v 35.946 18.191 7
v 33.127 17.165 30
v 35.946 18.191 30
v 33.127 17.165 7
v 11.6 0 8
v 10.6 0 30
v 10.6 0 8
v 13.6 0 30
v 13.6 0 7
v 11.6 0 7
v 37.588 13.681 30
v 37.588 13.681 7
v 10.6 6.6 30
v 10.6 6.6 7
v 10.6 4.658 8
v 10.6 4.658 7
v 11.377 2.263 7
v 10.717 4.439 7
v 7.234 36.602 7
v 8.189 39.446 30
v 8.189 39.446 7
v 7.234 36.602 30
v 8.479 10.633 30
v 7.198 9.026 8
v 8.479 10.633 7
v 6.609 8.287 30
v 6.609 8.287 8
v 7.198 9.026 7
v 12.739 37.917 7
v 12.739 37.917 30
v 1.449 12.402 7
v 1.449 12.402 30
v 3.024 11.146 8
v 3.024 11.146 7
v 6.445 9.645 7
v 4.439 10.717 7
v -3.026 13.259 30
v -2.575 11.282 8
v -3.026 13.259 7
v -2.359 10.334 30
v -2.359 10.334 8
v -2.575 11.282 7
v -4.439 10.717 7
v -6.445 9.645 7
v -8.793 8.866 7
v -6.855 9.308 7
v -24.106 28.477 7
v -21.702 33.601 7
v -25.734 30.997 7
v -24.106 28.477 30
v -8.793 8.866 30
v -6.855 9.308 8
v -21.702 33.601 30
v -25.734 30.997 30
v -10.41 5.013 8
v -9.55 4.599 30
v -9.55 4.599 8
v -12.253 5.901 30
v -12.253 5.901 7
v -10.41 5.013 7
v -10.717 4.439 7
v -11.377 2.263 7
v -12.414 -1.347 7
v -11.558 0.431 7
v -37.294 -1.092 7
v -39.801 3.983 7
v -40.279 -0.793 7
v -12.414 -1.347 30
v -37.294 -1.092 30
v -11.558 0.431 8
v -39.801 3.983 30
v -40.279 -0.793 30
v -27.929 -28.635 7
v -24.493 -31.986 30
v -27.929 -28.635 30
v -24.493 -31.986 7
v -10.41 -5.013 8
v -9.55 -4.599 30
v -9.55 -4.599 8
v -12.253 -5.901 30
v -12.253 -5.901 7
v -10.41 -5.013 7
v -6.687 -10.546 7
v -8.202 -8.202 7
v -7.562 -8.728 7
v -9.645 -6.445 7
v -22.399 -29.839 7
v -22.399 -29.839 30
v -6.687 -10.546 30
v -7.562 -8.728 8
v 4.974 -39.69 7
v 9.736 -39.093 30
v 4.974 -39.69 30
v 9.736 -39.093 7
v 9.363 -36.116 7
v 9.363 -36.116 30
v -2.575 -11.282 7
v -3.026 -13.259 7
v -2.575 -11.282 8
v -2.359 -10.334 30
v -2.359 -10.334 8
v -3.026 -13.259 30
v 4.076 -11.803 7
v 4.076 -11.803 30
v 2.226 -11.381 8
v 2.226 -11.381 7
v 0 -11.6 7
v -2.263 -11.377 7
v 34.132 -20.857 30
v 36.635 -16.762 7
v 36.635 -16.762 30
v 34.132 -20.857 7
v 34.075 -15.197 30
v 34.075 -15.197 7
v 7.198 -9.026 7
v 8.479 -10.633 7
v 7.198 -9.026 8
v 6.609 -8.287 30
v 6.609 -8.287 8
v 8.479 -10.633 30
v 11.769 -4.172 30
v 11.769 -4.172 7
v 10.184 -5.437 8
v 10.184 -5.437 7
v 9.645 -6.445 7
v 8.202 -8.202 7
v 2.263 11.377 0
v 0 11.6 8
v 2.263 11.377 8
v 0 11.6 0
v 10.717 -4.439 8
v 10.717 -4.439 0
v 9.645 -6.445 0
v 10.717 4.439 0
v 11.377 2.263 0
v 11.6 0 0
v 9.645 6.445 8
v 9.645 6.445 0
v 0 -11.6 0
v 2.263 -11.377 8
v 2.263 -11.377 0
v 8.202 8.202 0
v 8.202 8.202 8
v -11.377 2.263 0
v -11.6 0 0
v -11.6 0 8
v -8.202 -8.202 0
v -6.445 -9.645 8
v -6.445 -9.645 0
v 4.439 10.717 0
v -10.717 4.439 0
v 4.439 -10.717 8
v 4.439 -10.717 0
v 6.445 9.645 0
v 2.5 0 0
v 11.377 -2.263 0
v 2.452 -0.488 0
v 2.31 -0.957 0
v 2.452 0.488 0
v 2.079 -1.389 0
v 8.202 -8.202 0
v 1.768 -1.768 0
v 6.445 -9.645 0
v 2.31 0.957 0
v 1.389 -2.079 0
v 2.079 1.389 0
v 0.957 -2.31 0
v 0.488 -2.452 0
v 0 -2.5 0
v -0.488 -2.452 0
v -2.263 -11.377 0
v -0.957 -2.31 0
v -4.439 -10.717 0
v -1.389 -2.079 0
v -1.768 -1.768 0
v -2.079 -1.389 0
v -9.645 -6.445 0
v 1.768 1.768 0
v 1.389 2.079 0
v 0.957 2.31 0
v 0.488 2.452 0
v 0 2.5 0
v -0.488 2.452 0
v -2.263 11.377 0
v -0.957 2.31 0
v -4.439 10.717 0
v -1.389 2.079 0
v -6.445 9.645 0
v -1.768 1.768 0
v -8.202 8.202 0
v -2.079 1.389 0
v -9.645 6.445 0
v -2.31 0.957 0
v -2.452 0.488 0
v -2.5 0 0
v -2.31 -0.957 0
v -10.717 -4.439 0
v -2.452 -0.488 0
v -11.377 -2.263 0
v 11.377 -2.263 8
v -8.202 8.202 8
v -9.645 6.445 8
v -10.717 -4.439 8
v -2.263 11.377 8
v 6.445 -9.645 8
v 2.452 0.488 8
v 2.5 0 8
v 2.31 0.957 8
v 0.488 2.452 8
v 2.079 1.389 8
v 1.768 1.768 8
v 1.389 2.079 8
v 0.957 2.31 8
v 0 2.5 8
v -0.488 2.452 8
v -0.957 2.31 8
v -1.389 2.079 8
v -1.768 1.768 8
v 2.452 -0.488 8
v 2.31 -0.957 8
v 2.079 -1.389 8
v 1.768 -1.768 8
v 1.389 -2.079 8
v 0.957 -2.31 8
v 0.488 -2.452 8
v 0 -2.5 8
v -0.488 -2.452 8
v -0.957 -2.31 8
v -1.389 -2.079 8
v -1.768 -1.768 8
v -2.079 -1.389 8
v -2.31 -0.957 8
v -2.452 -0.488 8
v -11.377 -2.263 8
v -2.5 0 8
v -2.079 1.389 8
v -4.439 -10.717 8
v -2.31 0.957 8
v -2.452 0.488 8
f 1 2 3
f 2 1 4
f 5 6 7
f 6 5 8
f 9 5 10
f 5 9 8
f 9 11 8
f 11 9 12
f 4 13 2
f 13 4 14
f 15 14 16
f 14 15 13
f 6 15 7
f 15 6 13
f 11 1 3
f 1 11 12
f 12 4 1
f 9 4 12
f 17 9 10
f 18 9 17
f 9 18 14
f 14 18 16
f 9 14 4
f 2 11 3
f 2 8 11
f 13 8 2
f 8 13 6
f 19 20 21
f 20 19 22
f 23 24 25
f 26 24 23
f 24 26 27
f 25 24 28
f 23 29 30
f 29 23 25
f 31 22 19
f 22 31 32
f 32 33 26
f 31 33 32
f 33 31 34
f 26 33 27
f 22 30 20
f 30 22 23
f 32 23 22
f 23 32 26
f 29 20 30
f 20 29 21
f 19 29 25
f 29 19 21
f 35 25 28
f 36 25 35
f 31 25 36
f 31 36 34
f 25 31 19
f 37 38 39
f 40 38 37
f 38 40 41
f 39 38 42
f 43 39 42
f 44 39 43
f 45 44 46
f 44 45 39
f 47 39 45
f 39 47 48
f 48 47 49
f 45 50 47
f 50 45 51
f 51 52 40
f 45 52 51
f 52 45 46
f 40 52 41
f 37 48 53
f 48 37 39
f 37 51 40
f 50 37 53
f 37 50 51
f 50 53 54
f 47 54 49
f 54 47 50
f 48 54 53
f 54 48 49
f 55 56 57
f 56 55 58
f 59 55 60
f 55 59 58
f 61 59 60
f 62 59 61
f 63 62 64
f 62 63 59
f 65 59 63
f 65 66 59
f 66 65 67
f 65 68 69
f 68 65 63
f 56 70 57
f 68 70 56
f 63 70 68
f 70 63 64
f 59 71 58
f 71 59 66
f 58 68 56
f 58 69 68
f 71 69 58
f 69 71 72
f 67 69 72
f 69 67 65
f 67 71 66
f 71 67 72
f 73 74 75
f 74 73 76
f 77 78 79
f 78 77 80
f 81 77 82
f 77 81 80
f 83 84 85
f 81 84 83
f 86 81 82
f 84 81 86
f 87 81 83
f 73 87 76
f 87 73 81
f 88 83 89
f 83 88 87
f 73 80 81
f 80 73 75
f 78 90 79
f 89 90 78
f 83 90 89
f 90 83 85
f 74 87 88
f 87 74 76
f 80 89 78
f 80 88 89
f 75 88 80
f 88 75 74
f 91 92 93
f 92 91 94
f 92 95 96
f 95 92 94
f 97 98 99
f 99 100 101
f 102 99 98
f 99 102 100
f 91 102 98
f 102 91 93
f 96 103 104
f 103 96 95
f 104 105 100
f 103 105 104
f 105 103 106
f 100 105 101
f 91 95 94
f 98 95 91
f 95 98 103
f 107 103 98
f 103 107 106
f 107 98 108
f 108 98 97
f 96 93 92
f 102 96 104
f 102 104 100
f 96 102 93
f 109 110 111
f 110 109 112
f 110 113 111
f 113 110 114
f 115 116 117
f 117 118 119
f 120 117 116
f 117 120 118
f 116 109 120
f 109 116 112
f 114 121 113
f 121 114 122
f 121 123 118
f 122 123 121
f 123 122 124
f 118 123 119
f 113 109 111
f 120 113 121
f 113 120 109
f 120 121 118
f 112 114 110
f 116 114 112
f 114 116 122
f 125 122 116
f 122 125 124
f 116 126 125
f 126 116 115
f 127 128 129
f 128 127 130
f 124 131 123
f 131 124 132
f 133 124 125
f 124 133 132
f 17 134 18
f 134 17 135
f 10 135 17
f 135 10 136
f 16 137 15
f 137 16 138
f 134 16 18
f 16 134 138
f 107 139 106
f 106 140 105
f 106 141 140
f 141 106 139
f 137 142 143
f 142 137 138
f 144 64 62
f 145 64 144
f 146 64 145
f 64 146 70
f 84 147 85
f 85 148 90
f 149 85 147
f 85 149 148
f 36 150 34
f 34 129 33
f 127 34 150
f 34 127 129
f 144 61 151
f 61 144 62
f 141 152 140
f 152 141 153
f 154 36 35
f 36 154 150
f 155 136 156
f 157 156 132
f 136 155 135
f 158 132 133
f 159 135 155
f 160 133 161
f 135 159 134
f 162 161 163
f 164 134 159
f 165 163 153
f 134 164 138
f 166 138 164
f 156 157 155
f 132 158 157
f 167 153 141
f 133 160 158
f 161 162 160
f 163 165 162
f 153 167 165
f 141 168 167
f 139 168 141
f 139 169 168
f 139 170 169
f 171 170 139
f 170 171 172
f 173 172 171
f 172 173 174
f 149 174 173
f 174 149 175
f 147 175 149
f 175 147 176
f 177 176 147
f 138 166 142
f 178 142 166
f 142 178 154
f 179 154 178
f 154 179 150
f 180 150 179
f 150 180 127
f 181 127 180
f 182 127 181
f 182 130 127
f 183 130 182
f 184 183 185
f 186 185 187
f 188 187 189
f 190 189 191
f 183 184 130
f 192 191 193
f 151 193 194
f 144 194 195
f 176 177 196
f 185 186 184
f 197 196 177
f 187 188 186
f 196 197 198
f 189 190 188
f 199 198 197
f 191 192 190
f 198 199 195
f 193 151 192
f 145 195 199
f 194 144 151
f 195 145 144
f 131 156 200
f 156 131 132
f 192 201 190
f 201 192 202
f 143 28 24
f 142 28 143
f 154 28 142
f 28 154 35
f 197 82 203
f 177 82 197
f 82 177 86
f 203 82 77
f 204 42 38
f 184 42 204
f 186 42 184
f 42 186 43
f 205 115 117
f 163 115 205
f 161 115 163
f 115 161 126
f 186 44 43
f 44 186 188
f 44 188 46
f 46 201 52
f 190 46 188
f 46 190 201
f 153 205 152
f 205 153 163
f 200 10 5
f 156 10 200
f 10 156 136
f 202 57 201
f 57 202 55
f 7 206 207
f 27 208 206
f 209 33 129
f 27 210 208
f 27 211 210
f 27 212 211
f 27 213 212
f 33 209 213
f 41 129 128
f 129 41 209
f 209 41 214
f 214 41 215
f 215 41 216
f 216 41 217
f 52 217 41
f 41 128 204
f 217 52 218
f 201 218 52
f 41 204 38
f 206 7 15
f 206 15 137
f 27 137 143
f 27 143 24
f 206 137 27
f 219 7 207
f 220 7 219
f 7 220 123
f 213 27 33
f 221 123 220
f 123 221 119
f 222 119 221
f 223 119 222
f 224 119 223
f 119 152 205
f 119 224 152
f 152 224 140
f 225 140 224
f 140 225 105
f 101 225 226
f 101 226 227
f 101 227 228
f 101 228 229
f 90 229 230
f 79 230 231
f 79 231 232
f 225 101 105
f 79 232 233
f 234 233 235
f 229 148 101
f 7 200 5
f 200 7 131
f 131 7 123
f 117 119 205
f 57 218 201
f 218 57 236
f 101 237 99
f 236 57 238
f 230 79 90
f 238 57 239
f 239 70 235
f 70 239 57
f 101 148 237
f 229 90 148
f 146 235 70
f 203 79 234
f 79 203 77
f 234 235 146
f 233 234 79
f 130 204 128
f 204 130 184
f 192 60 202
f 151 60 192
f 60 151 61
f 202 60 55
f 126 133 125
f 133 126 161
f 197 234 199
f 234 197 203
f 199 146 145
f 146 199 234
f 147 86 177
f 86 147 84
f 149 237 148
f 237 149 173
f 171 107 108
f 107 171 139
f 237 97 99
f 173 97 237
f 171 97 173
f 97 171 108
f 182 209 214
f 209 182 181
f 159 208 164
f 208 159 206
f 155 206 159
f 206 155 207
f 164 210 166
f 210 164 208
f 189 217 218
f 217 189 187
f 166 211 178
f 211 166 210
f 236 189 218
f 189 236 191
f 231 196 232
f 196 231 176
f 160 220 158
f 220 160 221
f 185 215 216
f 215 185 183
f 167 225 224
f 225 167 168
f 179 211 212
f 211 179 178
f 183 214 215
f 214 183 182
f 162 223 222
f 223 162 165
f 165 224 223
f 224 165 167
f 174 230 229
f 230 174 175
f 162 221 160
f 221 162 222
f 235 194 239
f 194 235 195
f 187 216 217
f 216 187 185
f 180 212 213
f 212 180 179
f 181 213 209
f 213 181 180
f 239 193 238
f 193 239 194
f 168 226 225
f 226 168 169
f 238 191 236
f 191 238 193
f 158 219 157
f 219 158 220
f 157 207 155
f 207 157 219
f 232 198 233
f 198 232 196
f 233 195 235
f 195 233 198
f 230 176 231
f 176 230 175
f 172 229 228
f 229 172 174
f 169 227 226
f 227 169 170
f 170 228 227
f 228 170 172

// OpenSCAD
$fn = 32;

// ----------------------------------------------------------------------
// Impeller: 80 mm, 7 blades, 30 mm tall
// ----------------------------------------------------------------------

// --- parameters (mm) ---
hub_d = 23.2;             // hub diameter
hub_h = 8;                // hub height
imp_d = 80;               // outer diameter over the blades
blades = 7;               // number of blades
blade_t = 3;              // blade thickness
blade_h = 22;             // blade height
blade_in_r = 10.6;        // blade root radius
blade_out_r = 37;         // blade tip radius
sweep = 20;               // blade sweep, degrees
bore_d = 5;               // shaft bore

module hub() {
  cylinder(h = hub_h, d = hub_d);
}

module blade() {
  /* blade swept between two boxes: hull of the root and the tip section */
  hull() {
    translate([blade_in_r, 0, hub_h - 1])
      cube([blade_t, blade_t * 2.2, blade_h + 1], center = false);
    rotate([0, 0, sweep])
      translate([blade_out_r, 0, hub_h - 1])
        cube([blade_t, blade_t * 1.6, blade_h + 1], center = false);
  }
}

module blades() {
  for (i = [0 : blades - 1])
    rotate([0, 0, i * 360 / blades]) blade();
}

difference() {
  union() {
    hub();
    blades();
  }
  translate([0, 0, -1]) cylinder(h = hub_h + blade_h + 0 + 3, d = bore_d);
}
